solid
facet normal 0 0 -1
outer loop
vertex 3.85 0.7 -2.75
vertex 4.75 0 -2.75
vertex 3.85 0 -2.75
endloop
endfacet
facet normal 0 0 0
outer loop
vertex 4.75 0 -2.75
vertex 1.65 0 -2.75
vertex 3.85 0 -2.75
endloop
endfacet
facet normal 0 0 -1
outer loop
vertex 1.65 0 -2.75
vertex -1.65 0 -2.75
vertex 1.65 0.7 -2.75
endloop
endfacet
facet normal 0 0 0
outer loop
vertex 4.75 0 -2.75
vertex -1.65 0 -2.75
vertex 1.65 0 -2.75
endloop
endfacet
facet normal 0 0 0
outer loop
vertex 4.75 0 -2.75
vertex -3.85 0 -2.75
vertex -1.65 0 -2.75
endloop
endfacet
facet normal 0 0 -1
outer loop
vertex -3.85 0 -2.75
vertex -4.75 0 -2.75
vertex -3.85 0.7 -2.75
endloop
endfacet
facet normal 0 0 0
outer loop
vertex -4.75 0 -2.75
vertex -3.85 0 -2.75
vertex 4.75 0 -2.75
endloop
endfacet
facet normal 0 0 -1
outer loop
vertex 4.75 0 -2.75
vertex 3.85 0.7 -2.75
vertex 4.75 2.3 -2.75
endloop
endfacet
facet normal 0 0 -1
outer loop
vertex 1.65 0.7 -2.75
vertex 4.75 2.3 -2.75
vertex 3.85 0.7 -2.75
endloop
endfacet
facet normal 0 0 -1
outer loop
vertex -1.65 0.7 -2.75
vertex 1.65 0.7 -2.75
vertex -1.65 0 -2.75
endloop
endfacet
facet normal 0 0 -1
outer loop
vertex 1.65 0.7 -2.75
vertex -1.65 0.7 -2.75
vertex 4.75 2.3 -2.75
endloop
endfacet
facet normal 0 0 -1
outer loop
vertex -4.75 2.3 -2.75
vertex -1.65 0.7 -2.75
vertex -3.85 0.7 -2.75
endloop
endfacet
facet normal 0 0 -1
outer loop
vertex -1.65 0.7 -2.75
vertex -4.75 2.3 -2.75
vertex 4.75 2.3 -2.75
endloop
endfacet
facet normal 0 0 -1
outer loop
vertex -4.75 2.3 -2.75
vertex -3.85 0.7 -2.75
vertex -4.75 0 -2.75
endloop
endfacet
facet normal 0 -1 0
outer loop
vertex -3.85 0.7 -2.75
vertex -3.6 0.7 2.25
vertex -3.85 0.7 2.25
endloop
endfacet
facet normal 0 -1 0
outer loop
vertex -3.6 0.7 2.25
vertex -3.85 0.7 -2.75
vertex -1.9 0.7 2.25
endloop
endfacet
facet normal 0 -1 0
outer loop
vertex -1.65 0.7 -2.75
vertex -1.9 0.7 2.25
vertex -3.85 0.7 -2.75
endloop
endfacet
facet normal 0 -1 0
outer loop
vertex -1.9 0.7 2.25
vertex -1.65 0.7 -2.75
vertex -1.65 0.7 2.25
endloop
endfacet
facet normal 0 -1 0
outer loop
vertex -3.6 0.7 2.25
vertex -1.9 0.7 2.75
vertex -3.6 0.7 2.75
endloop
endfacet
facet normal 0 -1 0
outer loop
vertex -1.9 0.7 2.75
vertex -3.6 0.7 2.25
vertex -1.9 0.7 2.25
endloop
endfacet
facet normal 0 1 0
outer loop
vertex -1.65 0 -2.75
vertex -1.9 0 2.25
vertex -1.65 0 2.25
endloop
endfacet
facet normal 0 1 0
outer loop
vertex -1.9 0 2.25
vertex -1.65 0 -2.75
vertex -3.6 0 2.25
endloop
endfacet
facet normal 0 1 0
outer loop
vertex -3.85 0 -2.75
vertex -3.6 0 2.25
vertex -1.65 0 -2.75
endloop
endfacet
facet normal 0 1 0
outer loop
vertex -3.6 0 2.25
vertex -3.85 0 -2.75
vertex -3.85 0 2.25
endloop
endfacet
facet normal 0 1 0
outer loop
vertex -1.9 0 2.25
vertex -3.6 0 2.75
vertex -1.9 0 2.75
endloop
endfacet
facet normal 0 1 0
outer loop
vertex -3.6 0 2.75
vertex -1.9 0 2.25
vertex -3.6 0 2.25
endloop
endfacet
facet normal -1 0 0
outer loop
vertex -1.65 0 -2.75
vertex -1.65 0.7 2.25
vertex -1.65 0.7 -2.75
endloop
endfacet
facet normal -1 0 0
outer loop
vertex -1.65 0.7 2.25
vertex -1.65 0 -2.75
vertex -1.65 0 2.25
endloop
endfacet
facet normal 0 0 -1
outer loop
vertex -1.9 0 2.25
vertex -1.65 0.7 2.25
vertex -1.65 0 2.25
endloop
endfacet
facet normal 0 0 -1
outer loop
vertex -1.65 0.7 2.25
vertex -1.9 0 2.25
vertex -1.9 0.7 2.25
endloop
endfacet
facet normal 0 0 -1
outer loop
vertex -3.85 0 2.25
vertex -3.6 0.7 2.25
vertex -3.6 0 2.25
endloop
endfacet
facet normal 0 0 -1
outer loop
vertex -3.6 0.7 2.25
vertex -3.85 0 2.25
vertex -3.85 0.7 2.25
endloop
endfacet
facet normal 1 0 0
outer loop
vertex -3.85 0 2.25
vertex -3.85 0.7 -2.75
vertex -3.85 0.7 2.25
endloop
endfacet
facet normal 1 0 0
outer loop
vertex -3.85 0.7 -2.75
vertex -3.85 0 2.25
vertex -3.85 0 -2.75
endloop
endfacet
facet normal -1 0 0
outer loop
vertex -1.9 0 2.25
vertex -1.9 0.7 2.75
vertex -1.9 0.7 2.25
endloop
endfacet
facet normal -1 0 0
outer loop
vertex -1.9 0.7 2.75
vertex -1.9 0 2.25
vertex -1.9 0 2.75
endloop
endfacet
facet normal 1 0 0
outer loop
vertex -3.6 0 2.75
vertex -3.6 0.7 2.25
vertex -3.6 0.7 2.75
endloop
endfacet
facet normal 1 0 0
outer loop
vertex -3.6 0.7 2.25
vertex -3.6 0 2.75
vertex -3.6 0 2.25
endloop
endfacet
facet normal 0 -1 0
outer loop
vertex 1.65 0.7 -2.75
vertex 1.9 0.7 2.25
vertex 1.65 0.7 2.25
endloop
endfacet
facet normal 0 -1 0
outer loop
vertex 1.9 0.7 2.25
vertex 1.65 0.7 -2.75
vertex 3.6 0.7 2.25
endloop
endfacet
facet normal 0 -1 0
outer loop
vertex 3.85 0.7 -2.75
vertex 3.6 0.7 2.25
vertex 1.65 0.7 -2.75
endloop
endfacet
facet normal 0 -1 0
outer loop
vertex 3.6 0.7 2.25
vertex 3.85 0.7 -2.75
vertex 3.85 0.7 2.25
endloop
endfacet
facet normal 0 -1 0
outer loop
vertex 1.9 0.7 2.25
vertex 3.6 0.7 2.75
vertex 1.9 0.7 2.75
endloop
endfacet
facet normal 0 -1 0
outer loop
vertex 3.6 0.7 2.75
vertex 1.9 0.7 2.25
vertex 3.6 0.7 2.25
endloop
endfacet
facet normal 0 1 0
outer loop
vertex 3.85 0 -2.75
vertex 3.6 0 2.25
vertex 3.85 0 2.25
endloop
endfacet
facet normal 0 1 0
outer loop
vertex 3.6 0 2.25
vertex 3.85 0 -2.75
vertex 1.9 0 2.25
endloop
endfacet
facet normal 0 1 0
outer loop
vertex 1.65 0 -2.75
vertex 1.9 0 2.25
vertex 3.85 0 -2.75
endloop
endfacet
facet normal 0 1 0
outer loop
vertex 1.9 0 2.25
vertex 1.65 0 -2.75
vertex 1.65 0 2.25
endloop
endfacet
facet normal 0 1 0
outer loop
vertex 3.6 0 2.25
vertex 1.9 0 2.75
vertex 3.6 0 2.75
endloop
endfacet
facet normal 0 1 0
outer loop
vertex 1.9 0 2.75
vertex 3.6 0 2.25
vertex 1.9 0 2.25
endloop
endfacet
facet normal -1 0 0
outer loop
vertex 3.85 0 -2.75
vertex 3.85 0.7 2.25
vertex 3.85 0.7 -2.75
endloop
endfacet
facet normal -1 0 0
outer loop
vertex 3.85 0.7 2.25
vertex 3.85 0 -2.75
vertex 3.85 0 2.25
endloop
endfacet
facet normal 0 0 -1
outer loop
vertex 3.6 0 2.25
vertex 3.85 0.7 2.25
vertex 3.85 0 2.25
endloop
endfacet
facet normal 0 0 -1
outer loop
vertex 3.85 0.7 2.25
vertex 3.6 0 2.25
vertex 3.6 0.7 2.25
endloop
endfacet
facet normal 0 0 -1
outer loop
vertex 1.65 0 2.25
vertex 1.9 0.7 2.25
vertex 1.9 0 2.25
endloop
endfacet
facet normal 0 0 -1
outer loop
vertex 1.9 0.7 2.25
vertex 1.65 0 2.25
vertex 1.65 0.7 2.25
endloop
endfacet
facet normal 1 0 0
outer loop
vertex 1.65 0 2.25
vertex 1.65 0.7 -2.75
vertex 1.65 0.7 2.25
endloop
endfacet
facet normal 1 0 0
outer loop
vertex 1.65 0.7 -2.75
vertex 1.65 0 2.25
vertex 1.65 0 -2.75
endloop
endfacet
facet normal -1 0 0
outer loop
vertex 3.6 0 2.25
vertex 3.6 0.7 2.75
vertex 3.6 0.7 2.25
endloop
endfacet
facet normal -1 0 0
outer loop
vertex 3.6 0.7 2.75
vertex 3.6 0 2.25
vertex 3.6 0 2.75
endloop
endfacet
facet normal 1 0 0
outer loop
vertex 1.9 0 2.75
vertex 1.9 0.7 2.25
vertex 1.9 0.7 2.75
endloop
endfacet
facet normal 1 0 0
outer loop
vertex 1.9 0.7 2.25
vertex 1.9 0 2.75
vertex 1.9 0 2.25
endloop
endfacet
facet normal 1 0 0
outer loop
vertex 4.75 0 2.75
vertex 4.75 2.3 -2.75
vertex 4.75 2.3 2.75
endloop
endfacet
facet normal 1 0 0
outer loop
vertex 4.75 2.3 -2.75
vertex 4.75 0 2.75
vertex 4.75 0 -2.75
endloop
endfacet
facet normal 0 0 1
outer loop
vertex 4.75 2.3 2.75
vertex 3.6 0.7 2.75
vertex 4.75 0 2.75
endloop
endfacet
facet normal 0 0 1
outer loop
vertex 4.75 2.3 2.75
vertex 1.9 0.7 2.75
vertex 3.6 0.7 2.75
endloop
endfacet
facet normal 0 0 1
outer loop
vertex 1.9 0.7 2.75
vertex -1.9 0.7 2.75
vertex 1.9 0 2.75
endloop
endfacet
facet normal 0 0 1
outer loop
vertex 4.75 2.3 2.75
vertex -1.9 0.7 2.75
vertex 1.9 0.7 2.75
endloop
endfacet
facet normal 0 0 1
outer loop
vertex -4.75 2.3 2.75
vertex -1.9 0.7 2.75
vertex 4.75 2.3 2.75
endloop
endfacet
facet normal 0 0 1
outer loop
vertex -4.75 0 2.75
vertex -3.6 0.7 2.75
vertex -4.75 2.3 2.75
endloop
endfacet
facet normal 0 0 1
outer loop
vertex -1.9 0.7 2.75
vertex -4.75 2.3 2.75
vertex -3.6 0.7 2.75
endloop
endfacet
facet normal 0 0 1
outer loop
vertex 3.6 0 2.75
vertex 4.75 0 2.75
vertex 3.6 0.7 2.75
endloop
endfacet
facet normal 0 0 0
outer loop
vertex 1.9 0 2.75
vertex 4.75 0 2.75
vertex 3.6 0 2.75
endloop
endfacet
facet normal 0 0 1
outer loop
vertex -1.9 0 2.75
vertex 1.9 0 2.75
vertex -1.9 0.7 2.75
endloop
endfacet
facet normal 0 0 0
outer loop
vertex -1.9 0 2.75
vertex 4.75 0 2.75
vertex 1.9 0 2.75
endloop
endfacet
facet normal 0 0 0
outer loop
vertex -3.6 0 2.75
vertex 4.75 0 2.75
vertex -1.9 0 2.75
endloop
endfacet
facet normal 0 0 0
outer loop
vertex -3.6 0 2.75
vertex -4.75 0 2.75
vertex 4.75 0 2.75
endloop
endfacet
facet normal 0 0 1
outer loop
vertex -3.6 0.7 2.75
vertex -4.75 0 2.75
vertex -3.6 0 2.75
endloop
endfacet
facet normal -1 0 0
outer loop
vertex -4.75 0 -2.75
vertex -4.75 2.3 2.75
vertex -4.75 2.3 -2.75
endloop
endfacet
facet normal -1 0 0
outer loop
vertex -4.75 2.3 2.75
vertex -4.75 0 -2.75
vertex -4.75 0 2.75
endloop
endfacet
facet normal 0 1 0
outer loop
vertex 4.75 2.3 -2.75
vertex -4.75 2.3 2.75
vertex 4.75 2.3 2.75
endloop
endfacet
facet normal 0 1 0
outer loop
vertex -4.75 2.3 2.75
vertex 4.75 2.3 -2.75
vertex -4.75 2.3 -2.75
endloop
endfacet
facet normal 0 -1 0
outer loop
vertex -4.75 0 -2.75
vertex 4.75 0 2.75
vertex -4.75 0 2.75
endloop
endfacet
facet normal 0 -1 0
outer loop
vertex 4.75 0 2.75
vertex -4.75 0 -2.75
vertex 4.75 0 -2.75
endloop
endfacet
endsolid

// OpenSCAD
difference () {
  translate ([0, 1.15, 0]) {
    cube ([9.5, 2.3, 5.5], center=true);
  }
  union () {
    translate ([-2.75, 0, -6.75]) {
      translate ([0, 0.35, 0]) {
        union () {
          translate ([0, 0, 2]) {
            cube ([0.8, 0.7, 4], center=true);
          }
          translate ([0, 0, 6.5]) {
            cube ([2.2, 0.7, 5], center=true);
          }
          translate ([0, 0, 9.5]) {
            cube ([1.7, 0.7, 1], center=true);
          }
        }
      }
    }
    translate ([2.75, 0, -6.75]) {
      translate ([0, 0.35, 0]) {
        union () {
          translate ([0, 0, 2]) {
            cube ([0.8, 0.7, 4], center=true);
          }
          translate ([0, 0, 6.5]) {
            cube ([2.2, 0.7, 5], center=true);
          }
          translate ([0, 0, 9.5]) {
            cube ([1.7, 0.7, 1], center=true);
          }
        }
      }
    }
  }
}
